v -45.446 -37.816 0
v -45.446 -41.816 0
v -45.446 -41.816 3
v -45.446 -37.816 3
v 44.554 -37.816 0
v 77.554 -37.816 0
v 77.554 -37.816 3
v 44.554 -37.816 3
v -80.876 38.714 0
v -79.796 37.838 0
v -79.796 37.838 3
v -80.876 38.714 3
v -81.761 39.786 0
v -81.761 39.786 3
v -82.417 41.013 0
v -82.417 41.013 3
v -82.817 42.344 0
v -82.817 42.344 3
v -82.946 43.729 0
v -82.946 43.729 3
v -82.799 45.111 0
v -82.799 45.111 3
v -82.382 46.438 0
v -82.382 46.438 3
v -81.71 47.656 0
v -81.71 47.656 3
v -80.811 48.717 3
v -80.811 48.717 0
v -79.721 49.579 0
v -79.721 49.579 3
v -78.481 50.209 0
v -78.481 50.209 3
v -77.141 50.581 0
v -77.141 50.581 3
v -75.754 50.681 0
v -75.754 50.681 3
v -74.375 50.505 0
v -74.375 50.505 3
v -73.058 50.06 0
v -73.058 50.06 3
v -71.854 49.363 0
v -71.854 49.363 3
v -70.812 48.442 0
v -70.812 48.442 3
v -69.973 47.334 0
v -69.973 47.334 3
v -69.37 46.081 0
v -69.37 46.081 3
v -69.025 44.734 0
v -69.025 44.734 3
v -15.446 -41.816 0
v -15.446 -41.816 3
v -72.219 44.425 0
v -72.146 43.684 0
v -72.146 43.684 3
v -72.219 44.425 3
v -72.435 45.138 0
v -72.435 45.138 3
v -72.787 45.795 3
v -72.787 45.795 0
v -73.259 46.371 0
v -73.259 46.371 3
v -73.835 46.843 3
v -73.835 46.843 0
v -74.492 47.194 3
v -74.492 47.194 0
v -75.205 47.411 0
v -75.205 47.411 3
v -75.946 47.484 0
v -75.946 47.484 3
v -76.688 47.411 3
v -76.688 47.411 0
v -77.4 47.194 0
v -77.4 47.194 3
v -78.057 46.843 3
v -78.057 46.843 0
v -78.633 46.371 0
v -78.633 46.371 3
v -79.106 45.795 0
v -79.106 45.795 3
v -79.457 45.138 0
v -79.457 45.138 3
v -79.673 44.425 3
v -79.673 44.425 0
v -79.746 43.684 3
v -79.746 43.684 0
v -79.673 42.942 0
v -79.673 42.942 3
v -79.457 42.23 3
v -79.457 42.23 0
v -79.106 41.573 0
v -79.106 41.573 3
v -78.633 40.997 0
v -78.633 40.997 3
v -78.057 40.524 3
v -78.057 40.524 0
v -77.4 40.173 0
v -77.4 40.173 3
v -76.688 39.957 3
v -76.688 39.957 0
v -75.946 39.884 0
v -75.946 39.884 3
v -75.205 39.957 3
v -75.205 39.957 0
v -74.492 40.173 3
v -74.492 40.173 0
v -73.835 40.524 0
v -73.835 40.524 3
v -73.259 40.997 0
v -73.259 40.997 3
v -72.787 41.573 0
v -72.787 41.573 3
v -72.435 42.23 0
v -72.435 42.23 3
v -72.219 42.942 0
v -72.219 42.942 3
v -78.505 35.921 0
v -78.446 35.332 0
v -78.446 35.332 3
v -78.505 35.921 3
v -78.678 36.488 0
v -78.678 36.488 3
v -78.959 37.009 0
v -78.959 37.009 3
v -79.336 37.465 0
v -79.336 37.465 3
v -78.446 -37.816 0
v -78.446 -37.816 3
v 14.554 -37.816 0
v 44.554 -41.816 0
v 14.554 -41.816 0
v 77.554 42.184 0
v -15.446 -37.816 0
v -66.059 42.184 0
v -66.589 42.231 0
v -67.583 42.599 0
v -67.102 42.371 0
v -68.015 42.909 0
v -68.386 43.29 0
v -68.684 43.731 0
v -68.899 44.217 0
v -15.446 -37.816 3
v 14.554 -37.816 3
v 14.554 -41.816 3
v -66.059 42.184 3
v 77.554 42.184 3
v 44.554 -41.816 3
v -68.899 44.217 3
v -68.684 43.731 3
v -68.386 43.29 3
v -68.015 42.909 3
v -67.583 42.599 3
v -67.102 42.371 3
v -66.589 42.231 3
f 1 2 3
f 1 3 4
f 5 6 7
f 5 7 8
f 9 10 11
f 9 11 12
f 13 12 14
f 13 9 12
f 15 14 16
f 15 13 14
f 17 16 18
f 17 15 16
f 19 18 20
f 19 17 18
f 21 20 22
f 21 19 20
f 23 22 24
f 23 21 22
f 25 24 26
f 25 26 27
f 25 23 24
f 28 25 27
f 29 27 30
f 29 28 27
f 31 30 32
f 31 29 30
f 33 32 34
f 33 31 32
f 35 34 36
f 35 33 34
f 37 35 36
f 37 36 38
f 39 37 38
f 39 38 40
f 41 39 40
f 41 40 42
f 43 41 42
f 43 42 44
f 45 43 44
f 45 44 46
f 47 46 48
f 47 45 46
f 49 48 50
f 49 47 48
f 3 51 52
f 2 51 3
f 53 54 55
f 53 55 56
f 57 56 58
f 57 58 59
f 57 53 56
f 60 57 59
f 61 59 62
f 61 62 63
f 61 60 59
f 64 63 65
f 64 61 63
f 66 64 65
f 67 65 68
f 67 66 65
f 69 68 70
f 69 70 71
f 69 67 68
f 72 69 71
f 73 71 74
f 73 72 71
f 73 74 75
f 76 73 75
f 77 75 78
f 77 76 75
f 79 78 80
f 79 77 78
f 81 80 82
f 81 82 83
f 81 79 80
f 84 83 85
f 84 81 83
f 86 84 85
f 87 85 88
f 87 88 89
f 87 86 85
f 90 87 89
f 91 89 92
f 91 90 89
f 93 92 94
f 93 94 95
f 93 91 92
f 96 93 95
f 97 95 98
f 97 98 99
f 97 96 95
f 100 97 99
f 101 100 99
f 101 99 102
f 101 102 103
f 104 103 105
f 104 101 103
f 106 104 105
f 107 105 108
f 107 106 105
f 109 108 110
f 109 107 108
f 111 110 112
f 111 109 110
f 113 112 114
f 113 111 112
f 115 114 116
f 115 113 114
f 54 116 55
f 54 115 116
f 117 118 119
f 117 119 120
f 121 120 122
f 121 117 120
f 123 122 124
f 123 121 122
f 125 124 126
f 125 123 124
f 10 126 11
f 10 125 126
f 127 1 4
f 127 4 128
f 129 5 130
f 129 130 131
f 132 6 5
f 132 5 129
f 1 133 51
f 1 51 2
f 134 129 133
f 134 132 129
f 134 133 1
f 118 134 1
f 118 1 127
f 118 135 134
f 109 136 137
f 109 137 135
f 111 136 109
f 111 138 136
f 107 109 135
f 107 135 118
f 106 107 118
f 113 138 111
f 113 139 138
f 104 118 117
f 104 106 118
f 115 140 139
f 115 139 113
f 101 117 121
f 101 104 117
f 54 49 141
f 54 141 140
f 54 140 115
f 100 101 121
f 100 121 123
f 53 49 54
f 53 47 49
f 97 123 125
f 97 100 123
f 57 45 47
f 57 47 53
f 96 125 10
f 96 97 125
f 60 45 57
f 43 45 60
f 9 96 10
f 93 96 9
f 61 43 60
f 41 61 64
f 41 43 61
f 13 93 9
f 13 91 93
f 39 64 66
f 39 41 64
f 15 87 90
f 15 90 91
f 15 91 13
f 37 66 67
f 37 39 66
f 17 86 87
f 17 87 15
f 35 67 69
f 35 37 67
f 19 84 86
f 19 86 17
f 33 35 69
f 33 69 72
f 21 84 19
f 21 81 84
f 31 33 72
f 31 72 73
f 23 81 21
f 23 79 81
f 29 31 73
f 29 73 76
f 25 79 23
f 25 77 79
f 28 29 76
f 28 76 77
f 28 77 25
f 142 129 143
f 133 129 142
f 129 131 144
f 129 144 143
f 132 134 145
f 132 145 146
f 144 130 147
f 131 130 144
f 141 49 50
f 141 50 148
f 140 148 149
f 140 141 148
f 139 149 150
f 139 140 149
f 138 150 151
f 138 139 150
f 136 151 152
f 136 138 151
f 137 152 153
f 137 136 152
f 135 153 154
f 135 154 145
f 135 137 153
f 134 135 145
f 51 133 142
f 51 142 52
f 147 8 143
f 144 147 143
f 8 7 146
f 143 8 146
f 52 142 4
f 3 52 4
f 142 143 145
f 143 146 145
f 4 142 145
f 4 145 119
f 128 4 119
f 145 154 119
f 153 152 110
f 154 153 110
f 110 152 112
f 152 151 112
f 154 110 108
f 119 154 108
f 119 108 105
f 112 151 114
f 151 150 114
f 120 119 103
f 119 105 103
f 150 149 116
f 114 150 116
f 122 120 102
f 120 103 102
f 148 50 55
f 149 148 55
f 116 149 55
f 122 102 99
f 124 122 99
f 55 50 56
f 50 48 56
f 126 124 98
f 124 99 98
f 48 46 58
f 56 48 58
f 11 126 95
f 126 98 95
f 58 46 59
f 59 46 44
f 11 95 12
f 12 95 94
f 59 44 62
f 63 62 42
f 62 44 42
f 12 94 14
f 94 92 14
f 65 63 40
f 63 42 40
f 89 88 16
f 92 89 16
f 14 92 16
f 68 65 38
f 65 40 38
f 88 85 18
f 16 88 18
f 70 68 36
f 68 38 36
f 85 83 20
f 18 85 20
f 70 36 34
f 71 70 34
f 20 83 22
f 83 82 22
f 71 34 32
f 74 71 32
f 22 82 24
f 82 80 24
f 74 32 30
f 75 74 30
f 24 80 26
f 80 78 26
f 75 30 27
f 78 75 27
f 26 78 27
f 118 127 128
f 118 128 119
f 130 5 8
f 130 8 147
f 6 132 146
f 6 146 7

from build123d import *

# Parameters (mm, degrees)
SKETCH1_R           = 3.8
BOSS_EXTRUDE1_DEPTH = 3


with BuildPart() as part:
    # Sketch1 → Boss-Extrude1 (new body)
    with BuildSketch(Plane.XY):
        with BuildLine():
            Line((-45.446220454, -41.816247618), (-45.446220454, -37.816247618))
            Line((-45.446220454, -37.816247618), (-75.446220454, -37.816247618))
            Line((-75.446220454, -37.816247618), (-78.446220454, -37.816247618))
            Line((-78.446220454, -37.816247618), (-78.446220454, 35.332105838))
            ThreePointArc((-78.446220454, 35.332105838), (-78.805197925, 36.755130785), (-79.796220454, 37.837599801))
            ThreePointArc((-79.796220454, 37.837599801), (-79.720698736, 49.578946501), (-69.025418478, 44.733752382))
            ThreePointArc((-69.025418478, 44.733752382), (-68.015121209, 42.908889749), (-66.059360488, 42.183752382))
            Line((-66.059360488, 42.183752382), (77.553779546, 42.183752382))
            Line((77.553779546, 42.183752382), (77.553779546, -37.816247618))
            Line((77.553779546, -37.816247618), (44.553779546, -37.816247618))
            Line((44.553779546, -37.816247618), (44.553779546, -41.816247618))
            Line((44.553779546, -41.816247618), (14.553779546, -41.816247618))
            Line((14.553779546, -41.816247618), (14.553779546, -37.816247618))
            Line((14.553779546, -37.816247618), (-15.446220454, -37.816247618))
            Line((-15.446220454, -37.816247618), (-15.446220454, -41.816247618))
            Line((-15.446220454, -41.816247618), (-45.446220454, -41.816247618))
        make_face()
        with Locations((-75.946220454, 43.683752382)):
            Circle(SKETCH1_R, mode=Mode.SUBTRACT)
    extrude(amount=BOSS_EXTRUDE1_DEPTH)


solid = part.part
